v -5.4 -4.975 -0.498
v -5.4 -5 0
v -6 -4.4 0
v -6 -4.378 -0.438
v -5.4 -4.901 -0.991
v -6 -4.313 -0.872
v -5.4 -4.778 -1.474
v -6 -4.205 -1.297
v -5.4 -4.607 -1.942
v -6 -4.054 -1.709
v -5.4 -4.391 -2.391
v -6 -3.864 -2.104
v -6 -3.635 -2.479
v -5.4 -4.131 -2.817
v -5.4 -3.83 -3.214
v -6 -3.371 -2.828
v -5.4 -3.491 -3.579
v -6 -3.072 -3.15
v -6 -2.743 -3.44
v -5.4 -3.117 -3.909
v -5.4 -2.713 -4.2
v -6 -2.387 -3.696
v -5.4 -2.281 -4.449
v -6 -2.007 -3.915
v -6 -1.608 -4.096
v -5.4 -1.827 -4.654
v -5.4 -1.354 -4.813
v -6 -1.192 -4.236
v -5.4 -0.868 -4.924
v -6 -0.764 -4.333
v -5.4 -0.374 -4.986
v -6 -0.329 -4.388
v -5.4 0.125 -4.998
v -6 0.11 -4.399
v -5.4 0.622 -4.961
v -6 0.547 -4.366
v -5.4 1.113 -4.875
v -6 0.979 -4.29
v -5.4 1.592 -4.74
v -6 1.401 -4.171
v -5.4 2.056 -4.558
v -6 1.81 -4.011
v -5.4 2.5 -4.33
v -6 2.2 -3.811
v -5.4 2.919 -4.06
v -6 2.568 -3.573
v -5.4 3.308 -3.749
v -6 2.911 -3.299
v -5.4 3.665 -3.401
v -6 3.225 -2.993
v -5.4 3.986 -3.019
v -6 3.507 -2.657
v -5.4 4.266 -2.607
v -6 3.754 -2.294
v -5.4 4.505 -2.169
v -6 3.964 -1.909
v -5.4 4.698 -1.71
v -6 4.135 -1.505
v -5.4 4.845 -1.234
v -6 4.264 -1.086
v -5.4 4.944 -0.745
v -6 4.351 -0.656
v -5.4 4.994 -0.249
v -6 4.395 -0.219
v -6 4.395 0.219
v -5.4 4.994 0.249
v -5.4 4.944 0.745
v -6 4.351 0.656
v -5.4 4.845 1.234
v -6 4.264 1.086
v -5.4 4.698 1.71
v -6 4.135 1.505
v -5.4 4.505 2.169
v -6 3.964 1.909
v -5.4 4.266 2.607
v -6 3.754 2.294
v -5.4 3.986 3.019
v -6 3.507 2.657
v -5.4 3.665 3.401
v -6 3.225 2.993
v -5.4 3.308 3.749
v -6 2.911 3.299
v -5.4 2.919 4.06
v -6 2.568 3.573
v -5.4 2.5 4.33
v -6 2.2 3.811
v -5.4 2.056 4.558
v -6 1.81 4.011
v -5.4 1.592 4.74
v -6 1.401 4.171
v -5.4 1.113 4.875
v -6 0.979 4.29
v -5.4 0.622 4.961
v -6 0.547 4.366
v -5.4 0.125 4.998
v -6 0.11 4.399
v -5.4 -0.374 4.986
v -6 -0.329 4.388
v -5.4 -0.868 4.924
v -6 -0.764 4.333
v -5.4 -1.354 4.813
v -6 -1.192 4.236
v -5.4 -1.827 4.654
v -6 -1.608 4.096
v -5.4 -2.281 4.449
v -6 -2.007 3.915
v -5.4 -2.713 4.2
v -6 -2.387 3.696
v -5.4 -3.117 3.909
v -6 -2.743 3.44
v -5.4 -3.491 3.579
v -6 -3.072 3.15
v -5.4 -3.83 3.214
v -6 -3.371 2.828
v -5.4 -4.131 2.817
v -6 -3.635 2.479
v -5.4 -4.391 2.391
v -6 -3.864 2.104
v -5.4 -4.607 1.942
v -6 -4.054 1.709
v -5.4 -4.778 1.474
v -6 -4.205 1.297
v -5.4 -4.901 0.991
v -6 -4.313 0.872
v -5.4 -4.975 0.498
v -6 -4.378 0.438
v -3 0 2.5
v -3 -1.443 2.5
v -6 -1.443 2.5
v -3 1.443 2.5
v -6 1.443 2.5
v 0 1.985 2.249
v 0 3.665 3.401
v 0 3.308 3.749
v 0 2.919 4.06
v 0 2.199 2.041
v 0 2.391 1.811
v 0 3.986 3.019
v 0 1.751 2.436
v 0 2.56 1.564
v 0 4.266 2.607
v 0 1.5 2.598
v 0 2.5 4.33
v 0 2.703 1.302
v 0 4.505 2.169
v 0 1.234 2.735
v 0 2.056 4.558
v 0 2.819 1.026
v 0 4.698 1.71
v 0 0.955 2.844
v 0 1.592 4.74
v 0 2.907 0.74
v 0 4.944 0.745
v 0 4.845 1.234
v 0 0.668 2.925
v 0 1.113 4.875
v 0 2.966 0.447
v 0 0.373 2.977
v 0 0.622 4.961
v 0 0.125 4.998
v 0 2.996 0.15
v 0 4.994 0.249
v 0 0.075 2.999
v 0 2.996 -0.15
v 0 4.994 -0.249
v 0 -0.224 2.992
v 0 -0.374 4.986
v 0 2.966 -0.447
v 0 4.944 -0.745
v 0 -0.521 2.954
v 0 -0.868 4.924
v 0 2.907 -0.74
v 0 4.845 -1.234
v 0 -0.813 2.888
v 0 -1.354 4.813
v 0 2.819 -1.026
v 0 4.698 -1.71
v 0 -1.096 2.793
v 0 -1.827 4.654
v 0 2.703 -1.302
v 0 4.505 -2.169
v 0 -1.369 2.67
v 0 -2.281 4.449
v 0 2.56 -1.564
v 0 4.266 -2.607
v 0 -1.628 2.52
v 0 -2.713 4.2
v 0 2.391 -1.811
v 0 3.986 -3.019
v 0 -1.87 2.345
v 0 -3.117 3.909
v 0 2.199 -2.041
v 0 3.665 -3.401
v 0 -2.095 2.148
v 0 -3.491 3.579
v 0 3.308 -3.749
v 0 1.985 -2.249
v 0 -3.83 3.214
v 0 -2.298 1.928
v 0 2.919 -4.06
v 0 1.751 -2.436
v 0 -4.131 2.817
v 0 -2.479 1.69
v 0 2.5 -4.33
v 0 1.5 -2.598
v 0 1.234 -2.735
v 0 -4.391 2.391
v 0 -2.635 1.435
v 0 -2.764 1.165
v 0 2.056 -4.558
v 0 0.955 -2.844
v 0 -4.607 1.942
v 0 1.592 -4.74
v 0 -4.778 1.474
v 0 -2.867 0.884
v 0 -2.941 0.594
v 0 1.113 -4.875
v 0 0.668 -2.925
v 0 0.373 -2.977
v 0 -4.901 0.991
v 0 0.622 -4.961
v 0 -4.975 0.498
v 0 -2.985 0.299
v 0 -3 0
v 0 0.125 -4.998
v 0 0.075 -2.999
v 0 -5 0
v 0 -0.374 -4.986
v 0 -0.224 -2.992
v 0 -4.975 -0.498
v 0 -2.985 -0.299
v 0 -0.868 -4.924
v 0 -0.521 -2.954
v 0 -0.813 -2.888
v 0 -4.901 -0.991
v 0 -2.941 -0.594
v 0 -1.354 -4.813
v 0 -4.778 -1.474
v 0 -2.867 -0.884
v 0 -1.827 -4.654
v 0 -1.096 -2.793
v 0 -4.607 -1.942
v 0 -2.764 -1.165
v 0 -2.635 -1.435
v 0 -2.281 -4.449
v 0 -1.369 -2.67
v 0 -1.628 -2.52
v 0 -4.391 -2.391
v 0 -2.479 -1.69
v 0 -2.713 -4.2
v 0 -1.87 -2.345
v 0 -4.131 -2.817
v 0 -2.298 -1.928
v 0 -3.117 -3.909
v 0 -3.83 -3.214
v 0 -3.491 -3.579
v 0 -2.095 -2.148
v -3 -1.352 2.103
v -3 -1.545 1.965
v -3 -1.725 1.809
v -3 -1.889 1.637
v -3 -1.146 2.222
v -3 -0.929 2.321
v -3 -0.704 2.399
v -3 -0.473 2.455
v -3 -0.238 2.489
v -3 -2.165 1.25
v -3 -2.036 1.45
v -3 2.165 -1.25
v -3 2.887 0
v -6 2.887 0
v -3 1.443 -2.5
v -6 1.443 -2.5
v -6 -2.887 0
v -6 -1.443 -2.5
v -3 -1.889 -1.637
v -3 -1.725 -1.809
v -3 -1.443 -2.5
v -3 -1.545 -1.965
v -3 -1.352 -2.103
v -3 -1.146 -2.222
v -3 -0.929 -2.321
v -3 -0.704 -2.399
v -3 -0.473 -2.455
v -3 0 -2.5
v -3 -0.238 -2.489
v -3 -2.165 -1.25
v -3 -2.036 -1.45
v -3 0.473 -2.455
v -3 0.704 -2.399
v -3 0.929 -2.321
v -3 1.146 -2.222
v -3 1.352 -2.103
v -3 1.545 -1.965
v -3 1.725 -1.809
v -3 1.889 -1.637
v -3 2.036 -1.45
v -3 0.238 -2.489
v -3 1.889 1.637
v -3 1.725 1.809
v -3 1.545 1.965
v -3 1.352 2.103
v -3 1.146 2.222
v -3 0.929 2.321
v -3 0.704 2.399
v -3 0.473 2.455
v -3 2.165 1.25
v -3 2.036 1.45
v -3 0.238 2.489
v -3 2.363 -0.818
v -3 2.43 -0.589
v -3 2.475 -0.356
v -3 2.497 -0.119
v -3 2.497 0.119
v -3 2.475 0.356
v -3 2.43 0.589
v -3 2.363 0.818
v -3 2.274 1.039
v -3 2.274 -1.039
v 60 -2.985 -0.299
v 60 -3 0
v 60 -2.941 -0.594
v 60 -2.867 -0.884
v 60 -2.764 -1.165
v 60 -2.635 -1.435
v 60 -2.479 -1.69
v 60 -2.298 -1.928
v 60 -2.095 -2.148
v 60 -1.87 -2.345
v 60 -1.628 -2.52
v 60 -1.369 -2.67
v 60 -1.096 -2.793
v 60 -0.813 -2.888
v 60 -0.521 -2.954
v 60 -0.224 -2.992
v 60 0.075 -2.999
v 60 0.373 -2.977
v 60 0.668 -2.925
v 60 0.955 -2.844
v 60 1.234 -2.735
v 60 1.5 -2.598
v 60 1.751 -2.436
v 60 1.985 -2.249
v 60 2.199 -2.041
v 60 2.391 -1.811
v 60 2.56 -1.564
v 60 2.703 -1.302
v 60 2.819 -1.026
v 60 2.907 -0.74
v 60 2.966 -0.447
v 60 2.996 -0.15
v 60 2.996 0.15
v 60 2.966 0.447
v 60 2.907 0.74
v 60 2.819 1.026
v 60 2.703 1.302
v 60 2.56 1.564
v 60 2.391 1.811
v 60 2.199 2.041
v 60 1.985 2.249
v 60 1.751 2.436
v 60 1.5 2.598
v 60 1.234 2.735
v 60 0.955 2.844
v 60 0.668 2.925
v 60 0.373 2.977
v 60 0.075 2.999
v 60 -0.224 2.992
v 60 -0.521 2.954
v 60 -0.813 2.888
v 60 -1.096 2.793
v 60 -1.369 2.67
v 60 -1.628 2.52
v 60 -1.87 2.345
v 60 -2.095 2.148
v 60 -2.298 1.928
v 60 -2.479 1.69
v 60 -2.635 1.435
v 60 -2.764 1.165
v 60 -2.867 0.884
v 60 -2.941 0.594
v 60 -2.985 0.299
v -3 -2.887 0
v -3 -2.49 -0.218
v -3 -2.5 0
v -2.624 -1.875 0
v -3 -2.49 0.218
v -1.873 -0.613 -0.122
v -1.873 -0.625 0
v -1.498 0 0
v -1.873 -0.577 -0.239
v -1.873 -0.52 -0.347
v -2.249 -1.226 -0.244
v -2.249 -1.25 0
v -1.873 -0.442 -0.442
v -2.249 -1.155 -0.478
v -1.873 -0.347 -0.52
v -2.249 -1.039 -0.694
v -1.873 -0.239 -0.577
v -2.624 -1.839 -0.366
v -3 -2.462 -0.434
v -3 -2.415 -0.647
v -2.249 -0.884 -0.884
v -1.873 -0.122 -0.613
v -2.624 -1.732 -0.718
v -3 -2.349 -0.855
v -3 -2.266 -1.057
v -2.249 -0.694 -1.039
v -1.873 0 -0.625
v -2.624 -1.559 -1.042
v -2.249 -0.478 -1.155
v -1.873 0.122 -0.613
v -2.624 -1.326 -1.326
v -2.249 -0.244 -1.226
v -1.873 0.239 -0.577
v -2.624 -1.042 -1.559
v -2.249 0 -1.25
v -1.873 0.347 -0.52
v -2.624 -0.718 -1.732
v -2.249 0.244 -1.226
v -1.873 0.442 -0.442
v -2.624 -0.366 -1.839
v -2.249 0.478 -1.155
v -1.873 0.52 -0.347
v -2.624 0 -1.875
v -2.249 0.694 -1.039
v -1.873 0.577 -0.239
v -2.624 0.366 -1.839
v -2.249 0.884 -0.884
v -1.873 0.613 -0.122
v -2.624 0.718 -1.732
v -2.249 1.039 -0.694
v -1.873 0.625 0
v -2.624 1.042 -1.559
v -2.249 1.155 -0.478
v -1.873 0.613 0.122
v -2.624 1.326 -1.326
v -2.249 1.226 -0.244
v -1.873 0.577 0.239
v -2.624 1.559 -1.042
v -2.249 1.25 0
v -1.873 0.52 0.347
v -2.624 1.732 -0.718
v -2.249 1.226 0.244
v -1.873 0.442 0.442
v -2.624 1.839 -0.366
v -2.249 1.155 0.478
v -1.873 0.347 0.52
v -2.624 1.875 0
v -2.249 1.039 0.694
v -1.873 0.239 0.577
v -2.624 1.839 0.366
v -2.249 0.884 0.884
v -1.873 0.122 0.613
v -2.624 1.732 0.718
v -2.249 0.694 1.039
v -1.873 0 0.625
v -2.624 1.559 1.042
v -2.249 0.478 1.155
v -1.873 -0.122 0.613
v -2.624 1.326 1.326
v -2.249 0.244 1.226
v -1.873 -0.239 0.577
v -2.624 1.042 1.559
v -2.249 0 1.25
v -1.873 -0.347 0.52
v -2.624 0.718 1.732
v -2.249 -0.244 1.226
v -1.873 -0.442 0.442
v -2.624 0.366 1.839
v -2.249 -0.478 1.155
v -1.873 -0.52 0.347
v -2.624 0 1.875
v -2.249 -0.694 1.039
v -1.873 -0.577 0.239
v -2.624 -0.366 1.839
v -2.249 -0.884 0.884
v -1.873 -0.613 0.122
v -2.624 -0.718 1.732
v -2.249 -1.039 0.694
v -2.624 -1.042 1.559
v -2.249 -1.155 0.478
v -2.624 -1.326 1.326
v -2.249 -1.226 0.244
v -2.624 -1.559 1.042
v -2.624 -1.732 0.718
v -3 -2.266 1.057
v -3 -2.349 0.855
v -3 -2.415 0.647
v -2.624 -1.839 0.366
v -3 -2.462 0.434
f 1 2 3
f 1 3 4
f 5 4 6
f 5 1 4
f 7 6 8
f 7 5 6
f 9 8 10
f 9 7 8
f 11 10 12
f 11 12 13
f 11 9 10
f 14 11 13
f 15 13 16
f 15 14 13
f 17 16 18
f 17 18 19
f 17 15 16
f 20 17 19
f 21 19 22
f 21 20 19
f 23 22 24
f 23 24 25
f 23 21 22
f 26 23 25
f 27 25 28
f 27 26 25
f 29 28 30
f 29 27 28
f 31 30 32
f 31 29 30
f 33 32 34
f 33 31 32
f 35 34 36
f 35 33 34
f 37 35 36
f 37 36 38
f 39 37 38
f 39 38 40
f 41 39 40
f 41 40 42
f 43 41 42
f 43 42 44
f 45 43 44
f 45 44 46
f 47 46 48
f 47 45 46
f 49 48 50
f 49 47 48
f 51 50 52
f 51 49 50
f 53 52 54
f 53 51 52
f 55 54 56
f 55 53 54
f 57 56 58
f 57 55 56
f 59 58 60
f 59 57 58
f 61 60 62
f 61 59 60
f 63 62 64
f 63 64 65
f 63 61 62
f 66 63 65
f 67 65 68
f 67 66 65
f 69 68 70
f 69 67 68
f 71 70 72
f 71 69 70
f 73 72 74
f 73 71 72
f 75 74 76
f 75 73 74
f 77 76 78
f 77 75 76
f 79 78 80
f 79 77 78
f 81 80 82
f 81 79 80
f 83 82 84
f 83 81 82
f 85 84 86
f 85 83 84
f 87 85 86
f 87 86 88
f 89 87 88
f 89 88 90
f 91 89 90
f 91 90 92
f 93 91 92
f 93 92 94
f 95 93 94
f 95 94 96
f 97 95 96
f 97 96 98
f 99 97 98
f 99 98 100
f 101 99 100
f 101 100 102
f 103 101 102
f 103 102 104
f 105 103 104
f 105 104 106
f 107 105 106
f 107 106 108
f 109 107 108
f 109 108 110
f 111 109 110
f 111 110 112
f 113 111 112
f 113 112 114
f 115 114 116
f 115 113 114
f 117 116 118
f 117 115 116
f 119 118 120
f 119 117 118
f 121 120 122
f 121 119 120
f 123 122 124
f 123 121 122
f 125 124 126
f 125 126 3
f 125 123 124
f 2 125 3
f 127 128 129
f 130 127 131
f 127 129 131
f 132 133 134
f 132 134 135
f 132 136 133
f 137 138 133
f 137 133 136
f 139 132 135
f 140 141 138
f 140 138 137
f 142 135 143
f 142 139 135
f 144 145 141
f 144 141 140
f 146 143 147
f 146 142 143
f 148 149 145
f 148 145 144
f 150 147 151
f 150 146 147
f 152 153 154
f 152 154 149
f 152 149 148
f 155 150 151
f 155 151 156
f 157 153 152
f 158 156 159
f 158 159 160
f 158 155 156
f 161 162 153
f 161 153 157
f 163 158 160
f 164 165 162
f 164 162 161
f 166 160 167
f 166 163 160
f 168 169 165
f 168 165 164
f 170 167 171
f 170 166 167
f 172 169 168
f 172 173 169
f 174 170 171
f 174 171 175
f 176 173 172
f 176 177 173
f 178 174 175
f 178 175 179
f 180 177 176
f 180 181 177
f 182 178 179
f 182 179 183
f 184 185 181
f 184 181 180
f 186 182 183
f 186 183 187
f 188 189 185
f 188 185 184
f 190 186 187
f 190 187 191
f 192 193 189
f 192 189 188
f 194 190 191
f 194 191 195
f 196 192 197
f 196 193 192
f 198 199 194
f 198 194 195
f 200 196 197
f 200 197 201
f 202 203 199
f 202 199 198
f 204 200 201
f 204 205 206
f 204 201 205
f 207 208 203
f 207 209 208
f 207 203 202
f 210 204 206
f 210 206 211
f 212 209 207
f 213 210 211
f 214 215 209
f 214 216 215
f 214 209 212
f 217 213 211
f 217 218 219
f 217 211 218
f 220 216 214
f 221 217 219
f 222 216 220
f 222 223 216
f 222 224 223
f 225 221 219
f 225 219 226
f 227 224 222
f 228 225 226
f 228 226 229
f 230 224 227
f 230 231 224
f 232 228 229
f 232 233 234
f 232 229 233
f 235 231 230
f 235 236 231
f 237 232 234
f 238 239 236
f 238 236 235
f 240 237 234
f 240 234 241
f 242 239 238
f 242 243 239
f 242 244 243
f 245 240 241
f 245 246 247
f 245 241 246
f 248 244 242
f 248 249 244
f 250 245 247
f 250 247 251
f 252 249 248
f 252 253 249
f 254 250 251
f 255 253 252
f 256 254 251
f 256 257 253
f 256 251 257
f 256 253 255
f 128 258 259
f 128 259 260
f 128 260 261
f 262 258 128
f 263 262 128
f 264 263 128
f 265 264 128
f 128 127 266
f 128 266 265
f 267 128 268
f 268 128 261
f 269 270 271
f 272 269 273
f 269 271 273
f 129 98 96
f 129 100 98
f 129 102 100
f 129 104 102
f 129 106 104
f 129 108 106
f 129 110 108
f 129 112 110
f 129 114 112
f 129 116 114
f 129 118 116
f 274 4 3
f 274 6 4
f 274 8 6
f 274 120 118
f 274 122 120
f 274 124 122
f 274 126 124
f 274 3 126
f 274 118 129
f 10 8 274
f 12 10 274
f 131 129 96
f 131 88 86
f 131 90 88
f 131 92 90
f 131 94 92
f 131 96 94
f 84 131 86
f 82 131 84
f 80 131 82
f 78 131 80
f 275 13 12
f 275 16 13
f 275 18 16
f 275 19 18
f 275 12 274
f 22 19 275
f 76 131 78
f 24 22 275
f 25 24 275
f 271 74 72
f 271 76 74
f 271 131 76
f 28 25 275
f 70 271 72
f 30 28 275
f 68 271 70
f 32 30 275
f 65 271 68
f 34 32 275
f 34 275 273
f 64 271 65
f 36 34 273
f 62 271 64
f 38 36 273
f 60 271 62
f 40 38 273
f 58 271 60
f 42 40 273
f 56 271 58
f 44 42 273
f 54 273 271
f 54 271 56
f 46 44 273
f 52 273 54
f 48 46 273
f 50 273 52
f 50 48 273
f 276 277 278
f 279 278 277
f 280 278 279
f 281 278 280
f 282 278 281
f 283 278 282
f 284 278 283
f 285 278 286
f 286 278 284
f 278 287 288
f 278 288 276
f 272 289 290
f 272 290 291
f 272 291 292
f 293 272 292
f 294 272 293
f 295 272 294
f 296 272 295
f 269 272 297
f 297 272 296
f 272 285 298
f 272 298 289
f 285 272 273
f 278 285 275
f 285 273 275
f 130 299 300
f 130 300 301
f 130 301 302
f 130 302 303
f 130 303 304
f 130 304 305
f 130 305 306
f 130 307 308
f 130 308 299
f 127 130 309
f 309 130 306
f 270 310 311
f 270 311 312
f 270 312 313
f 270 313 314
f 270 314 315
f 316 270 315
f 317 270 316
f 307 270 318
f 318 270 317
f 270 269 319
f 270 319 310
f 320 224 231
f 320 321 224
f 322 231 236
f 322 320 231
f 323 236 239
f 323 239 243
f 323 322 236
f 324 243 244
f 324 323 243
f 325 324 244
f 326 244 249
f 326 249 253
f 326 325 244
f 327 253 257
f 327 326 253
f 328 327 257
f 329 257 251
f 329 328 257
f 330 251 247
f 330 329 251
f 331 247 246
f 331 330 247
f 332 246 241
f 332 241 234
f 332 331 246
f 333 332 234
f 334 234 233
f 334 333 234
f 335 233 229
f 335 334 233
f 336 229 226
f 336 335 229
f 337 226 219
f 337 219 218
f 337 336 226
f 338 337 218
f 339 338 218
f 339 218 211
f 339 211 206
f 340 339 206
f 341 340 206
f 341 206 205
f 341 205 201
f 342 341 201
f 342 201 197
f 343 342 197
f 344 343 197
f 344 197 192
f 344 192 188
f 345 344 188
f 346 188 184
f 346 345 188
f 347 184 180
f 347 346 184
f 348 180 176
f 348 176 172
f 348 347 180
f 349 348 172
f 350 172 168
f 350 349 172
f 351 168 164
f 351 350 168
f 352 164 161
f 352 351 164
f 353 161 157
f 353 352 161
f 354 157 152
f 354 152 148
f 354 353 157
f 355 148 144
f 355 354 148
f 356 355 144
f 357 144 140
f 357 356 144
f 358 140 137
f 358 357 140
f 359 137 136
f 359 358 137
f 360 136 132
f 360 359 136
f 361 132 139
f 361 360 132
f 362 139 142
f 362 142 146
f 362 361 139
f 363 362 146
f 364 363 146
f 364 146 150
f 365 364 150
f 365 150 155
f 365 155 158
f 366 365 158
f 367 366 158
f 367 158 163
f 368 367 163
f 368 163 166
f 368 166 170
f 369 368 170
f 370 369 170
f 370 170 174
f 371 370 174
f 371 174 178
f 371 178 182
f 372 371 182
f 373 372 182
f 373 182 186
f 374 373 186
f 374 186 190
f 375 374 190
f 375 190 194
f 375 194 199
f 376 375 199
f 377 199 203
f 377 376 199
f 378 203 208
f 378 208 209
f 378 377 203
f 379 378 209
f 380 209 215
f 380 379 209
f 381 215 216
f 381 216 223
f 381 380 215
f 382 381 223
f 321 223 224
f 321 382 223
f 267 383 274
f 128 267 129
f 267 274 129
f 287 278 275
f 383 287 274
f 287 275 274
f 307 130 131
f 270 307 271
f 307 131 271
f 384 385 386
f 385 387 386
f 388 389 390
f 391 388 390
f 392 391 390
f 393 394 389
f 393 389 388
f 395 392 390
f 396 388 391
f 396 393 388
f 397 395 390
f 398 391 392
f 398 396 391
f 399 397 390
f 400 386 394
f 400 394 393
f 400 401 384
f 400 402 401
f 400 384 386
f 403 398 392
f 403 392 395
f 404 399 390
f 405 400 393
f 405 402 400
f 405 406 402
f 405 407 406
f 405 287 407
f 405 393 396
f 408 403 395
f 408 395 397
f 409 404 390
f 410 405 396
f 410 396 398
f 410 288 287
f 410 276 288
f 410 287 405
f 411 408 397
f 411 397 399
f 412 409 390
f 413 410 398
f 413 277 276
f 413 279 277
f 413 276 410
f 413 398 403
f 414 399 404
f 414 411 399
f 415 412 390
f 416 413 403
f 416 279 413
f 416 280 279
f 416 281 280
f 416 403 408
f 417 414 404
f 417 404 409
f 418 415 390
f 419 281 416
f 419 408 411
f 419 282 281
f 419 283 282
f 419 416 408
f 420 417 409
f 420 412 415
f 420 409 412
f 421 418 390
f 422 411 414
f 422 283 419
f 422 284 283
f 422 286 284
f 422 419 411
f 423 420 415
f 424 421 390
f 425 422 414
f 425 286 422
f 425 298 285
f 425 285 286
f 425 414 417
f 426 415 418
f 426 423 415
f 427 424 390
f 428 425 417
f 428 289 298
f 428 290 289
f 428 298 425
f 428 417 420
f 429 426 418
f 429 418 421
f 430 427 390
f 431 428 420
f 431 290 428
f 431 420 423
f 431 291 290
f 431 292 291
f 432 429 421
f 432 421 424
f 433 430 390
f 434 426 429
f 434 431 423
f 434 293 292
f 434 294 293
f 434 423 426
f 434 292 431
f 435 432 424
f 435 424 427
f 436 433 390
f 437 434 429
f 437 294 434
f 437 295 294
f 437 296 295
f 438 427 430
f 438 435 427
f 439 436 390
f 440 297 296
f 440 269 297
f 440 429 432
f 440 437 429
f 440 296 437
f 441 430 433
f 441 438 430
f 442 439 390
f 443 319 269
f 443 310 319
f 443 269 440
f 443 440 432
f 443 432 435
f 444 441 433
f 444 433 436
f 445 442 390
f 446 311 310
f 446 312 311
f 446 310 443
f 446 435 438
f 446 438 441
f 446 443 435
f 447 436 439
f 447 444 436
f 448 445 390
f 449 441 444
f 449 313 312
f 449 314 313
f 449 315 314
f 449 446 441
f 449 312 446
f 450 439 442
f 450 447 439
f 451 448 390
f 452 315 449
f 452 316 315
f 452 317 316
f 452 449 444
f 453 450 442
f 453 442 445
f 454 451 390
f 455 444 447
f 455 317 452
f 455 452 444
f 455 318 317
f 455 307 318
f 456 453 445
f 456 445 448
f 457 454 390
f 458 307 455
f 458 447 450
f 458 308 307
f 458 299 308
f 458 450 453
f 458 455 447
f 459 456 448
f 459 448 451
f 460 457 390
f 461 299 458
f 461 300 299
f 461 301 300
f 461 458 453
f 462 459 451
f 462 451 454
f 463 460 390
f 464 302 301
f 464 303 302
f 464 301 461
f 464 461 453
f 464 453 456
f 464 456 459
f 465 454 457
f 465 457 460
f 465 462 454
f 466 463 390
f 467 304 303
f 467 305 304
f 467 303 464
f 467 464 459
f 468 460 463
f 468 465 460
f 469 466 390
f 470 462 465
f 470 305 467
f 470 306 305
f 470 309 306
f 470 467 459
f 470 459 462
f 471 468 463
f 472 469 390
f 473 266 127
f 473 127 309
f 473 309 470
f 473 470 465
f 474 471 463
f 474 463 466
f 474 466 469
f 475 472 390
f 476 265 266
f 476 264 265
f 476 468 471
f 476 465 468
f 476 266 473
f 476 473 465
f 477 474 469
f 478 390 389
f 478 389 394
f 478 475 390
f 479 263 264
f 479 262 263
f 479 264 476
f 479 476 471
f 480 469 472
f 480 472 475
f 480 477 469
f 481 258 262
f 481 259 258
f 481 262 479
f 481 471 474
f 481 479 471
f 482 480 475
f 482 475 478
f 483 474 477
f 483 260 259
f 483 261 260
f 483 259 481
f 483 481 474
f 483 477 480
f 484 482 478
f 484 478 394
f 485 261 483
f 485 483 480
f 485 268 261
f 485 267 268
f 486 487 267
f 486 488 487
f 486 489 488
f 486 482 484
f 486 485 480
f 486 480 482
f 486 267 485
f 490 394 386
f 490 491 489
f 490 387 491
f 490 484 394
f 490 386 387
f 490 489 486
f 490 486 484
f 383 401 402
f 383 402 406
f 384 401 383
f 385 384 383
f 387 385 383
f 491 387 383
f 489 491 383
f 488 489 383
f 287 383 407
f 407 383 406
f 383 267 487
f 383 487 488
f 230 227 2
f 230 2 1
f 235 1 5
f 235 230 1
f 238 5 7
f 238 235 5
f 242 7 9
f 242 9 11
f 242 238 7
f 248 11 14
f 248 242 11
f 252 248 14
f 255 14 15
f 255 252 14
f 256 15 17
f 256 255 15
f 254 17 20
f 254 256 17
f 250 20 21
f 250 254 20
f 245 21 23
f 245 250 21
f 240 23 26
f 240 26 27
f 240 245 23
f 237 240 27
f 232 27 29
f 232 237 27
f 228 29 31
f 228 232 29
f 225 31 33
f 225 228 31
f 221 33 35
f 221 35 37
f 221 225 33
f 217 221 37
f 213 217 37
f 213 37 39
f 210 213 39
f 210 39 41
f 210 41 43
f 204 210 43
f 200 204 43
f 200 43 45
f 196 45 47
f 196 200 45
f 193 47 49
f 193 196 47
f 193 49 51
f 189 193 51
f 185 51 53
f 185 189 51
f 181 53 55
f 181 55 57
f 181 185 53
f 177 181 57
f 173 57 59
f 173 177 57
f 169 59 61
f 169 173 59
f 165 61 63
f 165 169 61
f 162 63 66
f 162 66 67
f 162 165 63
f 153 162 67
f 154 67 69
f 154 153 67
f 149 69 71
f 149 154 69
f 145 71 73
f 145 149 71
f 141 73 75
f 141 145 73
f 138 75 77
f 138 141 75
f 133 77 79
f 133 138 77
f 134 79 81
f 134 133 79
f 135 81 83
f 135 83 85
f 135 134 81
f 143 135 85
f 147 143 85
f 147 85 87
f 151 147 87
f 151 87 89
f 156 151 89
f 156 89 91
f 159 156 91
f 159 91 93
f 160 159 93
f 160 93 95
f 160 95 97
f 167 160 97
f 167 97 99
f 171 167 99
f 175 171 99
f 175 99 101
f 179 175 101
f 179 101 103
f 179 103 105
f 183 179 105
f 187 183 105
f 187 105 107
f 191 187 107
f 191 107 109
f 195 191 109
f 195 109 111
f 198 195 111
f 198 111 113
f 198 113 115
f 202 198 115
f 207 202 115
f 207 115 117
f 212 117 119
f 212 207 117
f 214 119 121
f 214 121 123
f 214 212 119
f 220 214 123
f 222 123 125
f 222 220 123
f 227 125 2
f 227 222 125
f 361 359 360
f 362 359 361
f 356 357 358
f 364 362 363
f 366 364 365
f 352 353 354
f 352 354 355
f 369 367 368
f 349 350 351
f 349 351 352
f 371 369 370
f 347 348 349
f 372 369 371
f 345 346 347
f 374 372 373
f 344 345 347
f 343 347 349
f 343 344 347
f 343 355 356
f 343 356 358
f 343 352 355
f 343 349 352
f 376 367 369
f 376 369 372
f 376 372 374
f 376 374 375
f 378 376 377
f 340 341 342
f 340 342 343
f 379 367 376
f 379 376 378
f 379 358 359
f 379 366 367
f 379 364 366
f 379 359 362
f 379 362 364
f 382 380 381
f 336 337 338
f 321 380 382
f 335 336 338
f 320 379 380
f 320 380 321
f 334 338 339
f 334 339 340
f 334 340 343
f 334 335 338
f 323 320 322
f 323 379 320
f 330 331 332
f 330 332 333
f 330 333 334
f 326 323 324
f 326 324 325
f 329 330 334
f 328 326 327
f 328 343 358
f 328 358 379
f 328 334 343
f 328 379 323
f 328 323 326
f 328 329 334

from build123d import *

# Parameters (mm, degrees)
CHAMFER1_SIZE      = 0.6
CUT_EXTRUDE1_DEPTH = 3


with BuildPart() as part:
    # Sketch1 → Revolve1 (revolve)
    with BuildSketch(Plane.XY, mode=Mode.PRIVATE) as revolve1_sk:
        Polygon((-6, 0), (-6, 5), (0, 5), (0, 3), (60, 3), (60, 0), align=None)
    revolve(revolve1_sk.sketch.rotate(Axis((-6, 0, 0), (1, 0, 0)), 180), axis=Axis((-6, 0, 0), (1, 0, 0)))

    # Chamfer1
    chamfer1_edges = [part.edges().sort_by_distance(p)[0] for p in [
        (-6, 5, 0),
    ]]
    chamfer(chamfer1_edges, length=CHAMFER1_SIZE)

    # Sketch2 → Cut-Revolve1 (revolve, cut)
    with BuildSketch(Plane.XY, mode=Mode.PRIVATE) as cut_revolve1_sk:
        Polygon((-1.497848452, 0), (-3, 2.5), (-6, 2.5), (-6, 0), align=None)
    revolve(cut_revolve1_sk.sketch.rotate(Axis((-6, 0, 0), (1, 0, 0)), 180), axis=Axis((-6, 0, 0), (1, 0, 0)), mode=Mode.SUBTRACT)

    # Sketch3 → Cut-Extrude1 (cut)
    with BuildSketch(Plane.ZY.offset(6)):
        Polygon((0, 2.886751346), (-2.5, 1.443375673), (-2.5, -1.443375673), (0, -2.886751346), (2.5, -1.443375673), (2.5, 1.443375673), align=None)
    extrude(amount=-CUT_EXTRUDE1_DEPTH, mode=Mode.SUBTRACT)


solid = part.part
